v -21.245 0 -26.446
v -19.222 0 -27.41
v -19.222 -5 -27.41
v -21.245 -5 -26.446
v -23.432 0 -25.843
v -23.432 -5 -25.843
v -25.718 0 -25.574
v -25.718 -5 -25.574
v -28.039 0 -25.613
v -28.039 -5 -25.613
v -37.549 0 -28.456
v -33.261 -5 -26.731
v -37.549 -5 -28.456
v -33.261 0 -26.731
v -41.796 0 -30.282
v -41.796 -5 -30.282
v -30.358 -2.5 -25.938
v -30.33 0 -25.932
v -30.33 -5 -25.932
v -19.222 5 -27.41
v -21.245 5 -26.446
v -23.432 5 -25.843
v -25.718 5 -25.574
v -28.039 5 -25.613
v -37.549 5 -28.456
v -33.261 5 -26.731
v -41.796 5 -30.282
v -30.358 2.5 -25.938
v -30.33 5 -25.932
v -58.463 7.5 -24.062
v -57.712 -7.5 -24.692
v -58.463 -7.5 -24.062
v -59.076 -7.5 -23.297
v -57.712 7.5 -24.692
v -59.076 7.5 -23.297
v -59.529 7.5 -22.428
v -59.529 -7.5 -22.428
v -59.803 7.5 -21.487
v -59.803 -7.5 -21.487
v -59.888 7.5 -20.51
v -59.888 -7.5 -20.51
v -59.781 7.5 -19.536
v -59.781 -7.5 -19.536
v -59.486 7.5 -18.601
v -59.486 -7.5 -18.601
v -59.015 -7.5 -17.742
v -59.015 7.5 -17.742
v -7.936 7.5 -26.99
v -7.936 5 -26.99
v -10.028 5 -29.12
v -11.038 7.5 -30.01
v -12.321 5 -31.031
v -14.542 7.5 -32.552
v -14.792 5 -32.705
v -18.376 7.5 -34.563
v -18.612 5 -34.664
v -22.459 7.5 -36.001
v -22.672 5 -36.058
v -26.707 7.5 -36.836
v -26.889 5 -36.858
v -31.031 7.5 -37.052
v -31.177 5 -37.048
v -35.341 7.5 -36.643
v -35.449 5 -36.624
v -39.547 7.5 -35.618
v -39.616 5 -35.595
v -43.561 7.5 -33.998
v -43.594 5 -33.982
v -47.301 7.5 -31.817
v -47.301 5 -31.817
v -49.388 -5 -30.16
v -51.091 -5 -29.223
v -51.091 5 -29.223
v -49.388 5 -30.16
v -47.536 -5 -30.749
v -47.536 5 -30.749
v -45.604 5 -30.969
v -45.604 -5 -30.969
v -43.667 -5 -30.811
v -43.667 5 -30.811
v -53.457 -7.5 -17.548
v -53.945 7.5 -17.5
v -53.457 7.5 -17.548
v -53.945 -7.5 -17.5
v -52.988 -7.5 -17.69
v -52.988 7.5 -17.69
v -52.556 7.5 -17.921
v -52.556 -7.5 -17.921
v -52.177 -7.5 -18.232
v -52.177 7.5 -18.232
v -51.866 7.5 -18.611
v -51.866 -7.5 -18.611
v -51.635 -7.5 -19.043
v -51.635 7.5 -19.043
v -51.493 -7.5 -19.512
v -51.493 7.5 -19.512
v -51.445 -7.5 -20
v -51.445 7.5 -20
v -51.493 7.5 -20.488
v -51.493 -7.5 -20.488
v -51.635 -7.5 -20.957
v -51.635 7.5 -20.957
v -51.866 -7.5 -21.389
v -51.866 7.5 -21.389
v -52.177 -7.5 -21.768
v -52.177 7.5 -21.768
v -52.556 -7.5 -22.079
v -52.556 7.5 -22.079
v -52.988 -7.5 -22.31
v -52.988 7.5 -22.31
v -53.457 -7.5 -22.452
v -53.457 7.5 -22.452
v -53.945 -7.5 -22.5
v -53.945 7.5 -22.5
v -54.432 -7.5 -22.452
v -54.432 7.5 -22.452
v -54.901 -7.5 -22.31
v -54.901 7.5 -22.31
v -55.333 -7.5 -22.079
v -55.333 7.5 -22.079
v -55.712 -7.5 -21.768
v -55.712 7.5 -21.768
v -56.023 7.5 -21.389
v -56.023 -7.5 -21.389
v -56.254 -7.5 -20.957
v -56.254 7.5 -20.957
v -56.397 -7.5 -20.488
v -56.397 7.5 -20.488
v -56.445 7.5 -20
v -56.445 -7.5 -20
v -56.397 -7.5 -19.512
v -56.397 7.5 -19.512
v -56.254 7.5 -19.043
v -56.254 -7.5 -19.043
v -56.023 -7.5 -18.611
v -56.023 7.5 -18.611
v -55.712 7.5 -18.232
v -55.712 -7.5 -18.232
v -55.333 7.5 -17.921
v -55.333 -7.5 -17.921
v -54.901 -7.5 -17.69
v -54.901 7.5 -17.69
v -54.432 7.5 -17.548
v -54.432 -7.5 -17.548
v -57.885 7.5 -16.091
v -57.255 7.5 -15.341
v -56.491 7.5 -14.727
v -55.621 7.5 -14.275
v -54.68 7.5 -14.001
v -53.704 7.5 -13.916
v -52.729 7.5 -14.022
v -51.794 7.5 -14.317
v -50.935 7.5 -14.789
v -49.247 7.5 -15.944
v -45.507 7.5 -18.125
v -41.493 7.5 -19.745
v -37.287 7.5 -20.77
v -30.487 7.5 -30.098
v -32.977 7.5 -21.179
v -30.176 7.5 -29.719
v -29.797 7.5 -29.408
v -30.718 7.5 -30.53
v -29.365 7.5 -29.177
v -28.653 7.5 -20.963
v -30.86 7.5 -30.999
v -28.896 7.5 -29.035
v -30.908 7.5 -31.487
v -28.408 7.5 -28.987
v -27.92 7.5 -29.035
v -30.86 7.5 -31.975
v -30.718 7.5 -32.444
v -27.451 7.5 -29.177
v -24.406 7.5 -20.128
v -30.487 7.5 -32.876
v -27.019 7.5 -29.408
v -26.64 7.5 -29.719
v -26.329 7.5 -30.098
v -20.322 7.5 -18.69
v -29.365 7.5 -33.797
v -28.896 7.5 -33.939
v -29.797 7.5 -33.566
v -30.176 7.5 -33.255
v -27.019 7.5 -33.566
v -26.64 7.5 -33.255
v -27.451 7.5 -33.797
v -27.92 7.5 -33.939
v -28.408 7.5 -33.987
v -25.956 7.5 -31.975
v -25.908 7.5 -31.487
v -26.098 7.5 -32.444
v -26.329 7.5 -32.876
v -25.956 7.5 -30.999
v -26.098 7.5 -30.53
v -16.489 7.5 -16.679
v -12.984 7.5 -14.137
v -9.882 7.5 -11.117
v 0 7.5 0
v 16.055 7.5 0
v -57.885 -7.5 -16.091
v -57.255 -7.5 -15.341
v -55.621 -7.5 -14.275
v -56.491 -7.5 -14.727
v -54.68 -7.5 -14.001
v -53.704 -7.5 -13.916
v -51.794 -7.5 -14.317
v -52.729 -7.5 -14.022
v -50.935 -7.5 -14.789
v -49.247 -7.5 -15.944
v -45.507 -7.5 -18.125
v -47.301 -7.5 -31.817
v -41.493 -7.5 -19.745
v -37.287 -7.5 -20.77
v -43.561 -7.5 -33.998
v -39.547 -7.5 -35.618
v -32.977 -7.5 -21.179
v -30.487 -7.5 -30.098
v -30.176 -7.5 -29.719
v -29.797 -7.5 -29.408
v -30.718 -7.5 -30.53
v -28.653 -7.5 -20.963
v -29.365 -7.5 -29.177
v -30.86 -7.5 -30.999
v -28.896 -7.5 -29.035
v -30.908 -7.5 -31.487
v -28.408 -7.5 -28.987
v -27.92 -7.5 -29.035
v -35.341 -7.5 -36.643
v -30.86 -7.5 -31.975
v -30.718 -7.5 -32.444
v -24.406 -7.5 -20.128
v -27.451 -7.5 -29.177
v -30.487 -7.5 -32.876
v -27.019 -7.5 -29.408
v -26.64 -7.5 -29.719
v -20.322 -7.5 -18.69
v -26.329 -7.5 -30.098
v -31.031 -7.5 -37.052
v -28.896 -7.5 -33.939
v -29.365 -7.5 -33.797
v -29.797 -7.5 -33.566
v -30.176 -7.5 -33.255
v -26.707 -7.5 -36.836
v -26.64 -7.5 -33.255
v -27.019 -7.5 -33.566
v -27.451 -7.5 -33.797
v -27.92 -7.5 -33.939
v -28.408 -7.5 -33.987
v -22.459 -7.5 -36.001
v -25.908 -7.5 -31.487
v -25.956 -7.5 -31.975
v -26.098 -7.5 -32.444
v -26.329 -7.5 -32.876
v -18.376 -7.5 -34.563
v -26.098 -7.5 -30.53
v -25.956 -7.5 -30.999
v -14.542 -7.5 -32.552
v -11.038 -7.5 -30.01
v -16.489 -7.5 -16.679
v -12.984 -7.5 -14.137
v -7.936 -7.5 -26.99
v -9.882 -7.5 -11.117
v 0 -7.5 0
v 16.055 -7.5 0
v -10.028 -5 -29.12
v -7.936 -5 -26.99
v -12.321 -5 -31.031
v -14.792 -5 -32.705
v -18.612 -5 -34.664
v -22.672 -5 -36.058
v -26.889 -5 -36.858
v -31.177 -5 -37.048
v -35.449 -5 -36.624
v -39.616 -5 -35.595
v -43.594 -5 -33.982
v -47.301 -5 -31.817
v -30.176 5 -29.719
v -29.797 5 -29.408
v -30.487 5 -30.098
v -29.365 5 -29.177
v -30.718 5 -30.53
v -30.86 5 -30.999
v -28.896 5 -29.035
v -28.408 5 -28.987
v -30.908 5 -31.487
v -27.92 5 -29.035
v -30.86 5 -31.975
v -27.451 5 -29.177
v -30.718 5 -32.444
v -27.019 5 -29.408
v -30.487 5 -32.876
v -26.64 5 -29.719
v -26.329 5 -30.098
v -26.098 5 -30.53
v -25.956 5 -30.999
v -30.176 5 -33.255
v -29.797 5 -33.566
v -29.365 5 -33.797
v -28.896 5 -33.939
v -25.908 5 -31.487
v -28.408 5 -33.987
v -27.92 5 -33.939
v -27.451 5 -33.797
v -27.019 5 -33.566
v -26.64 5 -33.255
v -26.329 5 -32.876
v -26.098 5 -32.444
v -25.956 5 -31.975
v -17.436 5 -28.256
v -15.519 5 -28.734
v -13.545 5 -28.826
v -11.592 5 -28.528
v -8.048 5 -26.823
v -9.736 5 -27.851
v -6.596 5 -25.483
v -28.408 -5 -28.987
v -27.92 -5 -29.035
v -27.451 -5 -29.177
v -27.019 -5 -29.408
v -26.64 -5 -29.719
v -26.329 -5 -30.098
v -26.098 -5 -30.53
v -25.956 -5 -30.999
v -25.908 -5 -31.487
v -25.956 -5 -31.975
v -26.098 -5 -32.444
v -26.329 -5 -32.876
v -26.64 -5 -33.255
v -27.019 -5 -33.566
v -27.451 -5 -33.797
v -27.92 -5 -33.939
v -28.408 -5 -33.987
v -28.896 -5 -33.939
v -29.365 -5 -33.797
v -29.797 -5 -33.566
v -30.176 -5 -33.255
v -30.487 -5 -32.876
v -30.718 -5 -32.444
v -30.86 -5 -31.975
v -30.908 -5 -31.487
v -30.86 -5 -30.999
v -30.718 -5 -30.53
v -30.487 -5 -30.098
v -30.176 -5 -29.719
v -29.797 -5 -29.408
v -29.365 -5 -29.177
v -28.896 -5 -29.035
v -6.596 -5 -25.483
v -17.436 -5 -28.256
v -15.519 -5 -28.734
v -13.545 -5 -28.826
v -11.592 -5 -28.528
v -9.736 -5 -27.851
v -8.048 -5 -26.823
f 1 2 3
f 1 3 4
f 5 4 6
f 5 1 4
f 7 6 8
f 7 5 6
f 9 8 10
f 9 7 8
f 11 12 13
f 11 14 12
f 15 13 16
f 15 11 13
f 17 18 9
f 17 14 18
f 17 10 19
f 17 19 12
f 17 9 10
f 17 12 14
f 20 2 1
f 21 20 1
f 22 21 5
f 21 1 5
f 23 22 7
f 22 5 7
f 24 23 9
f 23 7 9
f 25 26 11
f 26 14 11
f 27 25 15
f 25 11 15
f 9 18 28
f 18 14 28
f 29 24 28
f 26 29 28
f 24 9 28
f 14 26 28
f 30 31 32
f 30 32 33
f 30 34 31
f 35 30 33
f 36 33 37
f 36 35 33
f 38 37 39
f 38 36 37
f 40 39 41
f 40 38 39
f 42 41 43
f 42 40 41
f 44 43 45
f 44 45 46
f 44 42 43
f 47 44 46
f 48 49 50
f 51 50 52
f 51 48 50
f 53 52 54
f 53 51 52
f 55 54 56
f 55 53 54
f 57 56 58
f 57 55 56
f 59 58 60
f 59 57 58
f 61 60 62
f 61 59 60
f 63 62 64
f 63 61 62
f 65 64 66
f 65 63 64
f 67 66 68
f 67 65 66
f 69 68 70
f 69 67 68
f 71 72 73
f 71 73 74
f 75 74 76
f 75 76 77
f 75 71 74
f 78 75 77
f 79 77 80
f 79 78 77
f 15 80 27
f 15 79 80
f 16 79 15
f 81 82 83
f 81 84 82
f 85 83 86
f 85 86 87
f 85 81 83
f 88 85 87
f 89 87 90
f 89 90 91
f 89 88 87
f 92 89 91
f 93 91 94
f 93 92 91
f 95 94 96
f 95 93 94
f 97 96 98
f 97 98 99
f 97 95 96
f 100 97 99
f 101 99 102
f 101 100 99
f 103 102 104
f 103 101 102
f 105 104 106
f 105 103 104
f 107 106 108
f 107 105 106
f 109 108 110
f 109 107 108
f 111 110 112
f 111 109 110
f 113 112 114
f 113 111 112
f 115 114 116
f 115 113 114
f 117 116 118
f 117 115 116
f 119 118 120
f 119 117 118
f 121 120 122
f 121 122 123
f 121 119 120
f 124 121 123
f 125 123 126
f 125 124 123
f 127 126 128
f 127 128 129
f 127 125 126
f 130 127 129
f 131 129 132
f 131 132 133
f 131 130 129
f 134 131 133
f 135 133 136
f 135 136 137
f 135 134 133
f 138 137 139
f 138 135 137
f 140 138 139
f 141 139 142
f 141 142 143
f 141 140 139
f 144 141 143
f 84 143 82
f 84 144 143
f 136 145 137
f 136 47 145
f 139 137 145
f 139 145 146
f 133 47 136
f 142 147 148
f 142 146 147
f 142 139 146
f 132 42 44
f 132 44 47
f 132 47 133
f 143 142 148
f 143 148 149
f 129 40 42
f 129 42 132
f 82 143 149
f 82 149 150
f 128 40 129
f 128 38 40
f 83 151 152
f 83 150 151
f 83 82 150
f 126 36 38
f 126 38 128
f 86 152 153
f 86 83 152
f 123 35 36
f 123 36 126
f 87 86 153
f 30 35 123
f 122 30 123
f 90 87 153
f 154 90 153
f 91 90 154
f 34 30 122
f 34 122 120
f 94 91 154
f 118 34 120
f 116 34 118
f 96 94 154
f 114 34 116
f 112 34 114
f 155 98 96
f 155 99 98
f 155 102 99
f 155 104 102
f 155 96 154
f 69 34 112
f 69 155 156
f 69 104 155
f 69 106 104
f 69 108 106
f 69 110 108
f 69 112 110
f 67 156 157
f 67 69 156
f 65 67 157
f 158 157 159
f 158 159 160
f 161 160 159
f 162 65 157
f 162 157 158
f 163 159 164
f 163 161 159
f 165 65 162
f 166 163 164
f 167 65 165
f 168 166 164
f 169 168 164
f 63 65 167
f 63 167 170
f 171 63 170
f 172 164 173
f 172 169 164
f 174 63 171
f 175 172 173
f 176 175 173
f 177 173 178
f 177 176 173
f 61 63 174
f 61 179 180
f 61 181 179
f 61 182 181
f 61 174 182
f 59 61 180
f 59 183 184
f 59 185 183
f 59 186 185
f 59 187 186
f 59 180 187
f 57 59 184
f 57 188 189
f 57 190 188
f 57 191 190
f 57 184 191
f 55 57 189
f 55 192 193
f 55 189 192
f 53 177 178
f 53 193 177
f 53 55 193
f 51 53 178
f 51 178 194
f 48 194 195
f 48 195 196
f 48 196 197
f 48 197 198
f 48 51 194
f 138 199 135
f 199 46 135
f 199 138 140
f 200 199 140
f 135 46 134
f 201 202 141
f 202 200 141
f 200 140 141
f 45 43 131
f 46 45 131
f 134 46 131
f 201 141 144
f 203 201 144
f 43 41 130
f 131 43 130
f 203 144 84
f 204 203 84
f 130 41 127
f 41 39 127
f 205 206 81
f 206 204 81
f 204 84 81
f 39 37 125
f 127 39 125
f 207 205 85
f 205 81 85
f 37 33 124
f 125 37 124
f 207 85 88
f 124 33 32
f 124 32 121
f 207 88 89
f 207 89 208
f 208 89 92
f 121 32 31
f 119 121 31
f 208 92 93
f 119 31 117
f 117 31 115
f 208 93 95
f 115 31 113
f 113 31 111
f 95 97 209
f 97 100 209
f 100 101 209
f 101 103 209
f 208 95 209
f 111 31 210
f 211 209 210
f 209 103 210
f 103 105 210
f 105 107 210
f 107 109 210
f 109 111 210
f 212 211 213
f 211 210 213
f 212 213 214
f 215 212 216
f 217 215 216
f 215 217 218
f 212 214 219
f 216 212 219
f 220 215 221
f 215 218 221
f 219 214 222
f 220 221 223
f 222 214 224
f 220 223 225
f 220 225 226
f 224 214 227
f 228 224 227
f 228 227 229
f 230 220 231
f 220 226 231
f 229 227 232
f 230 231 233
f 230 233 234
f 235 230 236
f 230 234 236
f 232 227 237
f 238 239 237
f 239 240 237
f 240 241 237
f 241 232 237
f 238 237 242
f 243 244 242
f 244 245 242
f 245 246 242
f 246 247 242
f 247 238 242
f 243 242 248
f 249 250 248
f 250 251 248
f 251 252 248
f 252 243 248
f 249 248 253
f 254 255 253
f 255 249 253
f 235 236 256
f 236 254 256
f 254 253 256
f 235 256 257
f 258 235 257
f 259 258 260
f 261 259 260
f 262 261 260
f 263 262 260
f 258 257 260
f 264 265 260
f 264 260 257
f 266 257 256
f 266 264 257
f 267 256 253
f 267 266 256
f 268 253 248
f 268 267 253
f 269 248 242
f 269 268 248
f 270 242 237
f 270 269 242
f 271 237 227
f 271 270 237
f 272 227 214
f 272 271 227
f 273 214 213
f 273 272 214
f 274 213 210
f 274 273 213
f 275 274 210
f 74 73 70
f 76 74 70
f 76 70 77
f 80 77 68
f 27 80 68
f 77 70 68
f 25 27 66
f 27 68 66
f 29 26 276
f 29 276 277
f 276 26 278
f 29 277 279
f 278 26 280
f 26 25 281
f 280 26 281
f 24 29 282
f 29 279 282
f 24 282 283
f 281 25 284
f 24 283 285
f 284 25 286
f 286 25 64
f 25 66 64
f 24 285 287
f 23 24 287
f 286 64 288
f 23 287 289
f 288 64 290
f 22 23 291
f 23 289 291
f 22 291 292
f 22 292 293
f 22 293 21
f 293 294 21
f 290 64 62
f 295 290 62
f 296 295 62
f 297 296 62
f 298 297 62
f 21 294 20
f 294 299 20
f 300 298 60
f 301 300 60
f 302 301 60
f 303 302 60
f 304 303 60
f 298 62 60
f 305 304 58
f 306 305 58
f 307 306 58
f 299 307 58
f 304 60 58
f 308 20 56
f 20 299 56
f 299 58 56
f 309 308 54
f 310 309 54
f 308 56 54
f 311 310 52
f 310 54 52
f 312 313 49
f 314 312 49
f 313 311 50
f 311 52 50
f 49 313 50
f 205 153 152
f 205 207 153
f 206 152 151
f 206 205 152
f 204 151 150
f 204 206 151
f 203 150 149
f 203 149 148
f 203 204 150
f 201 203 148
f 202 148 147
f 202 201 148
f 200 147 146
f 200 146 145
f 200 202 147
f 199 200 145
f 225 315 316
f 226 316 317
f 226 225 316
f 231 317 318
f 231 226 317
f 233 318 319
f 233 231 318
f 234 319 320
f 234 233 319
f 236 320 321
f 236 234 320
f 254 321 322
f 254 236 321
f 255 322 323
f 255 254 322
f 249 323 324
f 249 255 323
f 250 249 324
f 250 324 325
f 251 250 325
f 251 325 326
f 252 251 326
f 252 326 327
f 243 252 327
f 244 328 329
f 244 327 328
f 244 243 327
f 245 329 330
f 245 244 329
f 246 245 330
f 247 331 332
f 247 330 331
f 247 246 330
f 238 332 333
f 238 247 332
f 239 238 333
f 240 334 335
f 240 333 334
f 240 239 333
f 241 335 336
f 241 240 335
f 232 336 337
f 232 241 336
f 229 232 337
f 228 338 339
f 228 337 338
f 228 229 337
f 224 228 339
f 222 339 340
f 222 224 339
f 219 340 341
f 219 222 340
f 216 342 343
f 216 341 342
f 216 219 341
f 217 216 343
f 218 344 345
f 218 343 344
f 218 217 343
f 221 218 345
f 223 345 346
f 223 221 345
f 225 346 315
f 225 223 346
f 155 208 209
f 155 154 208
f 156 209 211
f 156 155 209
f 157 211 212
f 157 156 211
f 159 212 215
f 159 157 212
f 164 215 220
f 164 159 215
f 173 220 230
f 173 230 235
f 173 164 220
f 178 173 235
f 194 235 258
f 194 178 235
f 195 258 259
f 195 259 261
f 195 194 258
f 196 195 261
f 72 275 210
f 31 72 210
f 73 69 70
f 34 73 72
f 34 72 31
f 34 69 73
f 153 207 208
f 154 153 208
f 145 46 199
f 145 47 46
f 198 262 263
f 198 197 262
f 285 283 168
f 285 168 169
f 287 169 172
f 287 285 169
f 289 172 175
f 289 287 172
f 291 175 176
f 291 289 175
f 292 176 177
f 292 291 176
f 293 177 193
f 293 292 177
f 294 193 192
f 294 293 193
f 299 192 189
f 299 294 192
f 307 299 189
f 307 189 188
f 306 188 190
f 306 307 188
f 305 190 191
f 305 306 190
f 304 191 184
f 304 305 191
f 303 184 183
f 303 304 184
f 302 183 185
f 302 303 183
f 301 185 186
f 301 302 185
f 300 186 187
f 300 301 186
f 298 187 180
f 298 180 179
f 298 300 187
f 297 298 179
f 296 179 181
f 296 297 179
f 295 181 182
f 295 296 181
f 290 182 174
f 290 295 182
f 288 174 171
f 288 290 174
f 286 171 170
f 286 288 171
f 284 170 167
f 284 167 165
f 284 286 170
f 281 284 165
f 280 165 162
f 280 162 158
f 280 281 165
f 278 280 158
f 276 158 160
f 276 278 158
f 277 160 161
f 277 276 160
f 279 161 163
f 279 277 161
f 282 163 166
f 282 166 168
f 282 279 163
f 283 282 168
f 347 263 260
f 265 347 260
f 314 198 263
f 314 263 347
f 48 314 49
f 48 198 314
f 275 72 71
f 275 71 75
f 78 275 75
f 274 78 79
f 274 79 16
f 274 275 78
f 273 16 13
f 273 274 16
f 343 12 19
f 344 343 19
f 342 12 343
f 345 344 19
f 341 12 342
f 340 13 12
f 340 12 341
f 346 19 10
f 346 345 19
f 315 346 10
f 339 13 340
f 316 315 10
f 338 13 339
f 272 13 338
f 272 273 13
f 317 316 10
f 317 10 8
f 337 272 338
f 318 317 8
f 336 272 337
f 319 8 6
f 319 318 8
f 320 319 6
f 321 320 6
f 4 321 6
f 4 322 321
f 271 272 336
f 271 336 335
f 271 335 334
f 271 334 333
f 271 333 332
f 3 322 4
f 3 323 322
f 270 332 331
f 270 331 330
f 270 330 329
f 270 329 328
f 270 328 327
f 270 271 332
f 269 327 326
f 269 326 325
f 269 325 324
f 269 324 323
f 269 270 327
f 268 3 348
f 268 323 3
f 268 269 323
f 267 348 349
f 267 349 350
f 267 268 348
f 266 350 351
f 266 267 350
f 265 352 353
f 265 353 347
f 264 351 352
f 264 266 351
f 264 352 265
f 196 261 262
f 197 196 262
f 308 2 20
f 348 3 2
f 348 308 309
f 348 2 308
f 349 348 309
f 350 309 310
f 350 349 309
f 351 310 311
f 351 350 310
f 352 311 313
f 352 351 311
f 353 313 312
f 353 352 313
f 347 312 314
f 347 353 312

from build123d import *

# Parameters (mm, degrees)
SKETCH3_R           = 2.5
BOSS_EXTRUDE2_DEPTH = 7.5
CUT_EXTRUDE2_DEPTH  = 5
FILLET1_START       = -5
FILLET1_DEPTH       = 10
FILLET2_R           = 5


with BuildPart() as part:
    # Sketch3 → Boss-Extrude2 (new, symmetric)
    with BuildSketch(Plane(origin=(0, 0, 0), x_dir=(1, 0, 0), z_dir=(0, 1, 0))):
        with BuildLine():
            Line((0, 0), (16.055459438, 0))
            Line((16.055459438, 0), (-7.935861068, 26.99023557))
            ThreePointArc((-7.935861068, 26.99023557), (-26.707018244, 36.836313291), (-47.300903293, 31.817001905))
            Line((-47.300903293, 31.817001905), (-61.838574124, 21.868238869))
            Line((-61.838574124, 21.868238869), (-55.061469058, 11.965166269))
            Line((-55.061469058, 11.965166269), (-49.247161684, 15.944150727))
            ThreePointArc((-49.247161684, 15.944150727), (-28.653276634, 20.963462112), (-9.882119459, 11.117384391))
            Line((-9.882119459, 11.117384391), (0, 0))
        make_face()
        with Locations(Location((-53.944540562, 20, 0), (0, 0, 270))):
            Circle(SKETCH3_R, mode=Mode.SUBTRACT)
        with Locations(Location((-28.408134096, 31.487077096, 0), (0, 0, 270))):
            Circle(SKETCH3_R, mode=Mode.SUBTRACT)
    extrude(amount=BOSS_EXTRUDE2_DEPTH, both=True)

    # Sketch6 → Cut-Extrude2 (cut, symmetric)
    with BuildSketch(Plane(origin=(0, 0, 0), x_dir=(1, 0, 0), z_dir=(0, 1, 0))):
        with BuildLine():
            add(Edge.make_bspline(
                [(-14.79224673, 32.705040265), (-17.331871812, 26.215966366), (-31.296858097, 23.259335294), (-41.248027481, 30.965132279), (-47.300903293, 31.817001905)],
                knots=[0, 0, 0, 0, 0.502708052, 1, 1, 1, 1], degree=3))
            ThreePointArc((-14.79224673, 32.705040265), (-31.177344469, 37.048133404), (-47.300903293, 31.817001905))
        make_face()
    extrude(amount=CUT_EXTRUDE2_DEPTH, both=True, mode=Mode.SUBTRACT)

    # Fillet1: read off the stored shape, not the designer's step
    # Fillet1 outline → Fillet1 (cut)
    with BuildSketch(Plane(origin=(0, 0, 0), x_dir=(1, 0, 0), z_dir=(0, 1, 0)).offset(FILLET1_START)):
        with BuildLine():
            ThreePointArc((-19.221952817, 27.410351809), (-12.561308079, 28.72495355), (-6.596181971, 25.483096586))
            Line((-6.596181971, 25.483096586), (-7.935861068, 26.99023557))
            ThreePointArc((-7.935861068, 26.99023557), (-11.150327664, 30.10405779), (-14.79224673, 32.705040265))
            add(Edge.make_bspline(
                [(-14.79224673, 32.705040265), (-15.739998483, 30.283410709), (-17.311764452, 28.558502186), (-19.221952817, 27.410351809)],
                knots=[0, 0, 0, 0, 0.187603454, 0.187603454, 0.187603454, 0.187603454], degree=3))
        make_face()
        with BuildLine():
            ThreePointArc((-51.091167548, 29.223158548), (-46.575226496, 30.906360534), (-41.796439127, 30.281793648))
            add(Edge.make_bspline(
                [(-41.796439127, 30.281793648), (-43.564588599, 30.974367456), (-45.376964166, 31.546230564), (-47.300903293, 31.817001905)],
                knots=[0.84193308, 0.84193308, 0.84193308, 0.84193308, 1, 1, 1, 1], degree=3))
            Line((-47.300903293, 31.817001905), (-51.091167548, 29.223158548))
        make_face()
    extrude(amount=FILLET1_DEPTH, mode=Mode.SUBTRACT)

    # Fillet2
    fillet2_edges = [part.edges().sort_by_distance(p)[0] for p in [
        (-55.061469058, 0, -11.965166269),
        (-61.838574124, 0, -21.868238869),
    ]]
    fillet(fillet2_edges, radius=FILLET2_R)


solid = part.part
